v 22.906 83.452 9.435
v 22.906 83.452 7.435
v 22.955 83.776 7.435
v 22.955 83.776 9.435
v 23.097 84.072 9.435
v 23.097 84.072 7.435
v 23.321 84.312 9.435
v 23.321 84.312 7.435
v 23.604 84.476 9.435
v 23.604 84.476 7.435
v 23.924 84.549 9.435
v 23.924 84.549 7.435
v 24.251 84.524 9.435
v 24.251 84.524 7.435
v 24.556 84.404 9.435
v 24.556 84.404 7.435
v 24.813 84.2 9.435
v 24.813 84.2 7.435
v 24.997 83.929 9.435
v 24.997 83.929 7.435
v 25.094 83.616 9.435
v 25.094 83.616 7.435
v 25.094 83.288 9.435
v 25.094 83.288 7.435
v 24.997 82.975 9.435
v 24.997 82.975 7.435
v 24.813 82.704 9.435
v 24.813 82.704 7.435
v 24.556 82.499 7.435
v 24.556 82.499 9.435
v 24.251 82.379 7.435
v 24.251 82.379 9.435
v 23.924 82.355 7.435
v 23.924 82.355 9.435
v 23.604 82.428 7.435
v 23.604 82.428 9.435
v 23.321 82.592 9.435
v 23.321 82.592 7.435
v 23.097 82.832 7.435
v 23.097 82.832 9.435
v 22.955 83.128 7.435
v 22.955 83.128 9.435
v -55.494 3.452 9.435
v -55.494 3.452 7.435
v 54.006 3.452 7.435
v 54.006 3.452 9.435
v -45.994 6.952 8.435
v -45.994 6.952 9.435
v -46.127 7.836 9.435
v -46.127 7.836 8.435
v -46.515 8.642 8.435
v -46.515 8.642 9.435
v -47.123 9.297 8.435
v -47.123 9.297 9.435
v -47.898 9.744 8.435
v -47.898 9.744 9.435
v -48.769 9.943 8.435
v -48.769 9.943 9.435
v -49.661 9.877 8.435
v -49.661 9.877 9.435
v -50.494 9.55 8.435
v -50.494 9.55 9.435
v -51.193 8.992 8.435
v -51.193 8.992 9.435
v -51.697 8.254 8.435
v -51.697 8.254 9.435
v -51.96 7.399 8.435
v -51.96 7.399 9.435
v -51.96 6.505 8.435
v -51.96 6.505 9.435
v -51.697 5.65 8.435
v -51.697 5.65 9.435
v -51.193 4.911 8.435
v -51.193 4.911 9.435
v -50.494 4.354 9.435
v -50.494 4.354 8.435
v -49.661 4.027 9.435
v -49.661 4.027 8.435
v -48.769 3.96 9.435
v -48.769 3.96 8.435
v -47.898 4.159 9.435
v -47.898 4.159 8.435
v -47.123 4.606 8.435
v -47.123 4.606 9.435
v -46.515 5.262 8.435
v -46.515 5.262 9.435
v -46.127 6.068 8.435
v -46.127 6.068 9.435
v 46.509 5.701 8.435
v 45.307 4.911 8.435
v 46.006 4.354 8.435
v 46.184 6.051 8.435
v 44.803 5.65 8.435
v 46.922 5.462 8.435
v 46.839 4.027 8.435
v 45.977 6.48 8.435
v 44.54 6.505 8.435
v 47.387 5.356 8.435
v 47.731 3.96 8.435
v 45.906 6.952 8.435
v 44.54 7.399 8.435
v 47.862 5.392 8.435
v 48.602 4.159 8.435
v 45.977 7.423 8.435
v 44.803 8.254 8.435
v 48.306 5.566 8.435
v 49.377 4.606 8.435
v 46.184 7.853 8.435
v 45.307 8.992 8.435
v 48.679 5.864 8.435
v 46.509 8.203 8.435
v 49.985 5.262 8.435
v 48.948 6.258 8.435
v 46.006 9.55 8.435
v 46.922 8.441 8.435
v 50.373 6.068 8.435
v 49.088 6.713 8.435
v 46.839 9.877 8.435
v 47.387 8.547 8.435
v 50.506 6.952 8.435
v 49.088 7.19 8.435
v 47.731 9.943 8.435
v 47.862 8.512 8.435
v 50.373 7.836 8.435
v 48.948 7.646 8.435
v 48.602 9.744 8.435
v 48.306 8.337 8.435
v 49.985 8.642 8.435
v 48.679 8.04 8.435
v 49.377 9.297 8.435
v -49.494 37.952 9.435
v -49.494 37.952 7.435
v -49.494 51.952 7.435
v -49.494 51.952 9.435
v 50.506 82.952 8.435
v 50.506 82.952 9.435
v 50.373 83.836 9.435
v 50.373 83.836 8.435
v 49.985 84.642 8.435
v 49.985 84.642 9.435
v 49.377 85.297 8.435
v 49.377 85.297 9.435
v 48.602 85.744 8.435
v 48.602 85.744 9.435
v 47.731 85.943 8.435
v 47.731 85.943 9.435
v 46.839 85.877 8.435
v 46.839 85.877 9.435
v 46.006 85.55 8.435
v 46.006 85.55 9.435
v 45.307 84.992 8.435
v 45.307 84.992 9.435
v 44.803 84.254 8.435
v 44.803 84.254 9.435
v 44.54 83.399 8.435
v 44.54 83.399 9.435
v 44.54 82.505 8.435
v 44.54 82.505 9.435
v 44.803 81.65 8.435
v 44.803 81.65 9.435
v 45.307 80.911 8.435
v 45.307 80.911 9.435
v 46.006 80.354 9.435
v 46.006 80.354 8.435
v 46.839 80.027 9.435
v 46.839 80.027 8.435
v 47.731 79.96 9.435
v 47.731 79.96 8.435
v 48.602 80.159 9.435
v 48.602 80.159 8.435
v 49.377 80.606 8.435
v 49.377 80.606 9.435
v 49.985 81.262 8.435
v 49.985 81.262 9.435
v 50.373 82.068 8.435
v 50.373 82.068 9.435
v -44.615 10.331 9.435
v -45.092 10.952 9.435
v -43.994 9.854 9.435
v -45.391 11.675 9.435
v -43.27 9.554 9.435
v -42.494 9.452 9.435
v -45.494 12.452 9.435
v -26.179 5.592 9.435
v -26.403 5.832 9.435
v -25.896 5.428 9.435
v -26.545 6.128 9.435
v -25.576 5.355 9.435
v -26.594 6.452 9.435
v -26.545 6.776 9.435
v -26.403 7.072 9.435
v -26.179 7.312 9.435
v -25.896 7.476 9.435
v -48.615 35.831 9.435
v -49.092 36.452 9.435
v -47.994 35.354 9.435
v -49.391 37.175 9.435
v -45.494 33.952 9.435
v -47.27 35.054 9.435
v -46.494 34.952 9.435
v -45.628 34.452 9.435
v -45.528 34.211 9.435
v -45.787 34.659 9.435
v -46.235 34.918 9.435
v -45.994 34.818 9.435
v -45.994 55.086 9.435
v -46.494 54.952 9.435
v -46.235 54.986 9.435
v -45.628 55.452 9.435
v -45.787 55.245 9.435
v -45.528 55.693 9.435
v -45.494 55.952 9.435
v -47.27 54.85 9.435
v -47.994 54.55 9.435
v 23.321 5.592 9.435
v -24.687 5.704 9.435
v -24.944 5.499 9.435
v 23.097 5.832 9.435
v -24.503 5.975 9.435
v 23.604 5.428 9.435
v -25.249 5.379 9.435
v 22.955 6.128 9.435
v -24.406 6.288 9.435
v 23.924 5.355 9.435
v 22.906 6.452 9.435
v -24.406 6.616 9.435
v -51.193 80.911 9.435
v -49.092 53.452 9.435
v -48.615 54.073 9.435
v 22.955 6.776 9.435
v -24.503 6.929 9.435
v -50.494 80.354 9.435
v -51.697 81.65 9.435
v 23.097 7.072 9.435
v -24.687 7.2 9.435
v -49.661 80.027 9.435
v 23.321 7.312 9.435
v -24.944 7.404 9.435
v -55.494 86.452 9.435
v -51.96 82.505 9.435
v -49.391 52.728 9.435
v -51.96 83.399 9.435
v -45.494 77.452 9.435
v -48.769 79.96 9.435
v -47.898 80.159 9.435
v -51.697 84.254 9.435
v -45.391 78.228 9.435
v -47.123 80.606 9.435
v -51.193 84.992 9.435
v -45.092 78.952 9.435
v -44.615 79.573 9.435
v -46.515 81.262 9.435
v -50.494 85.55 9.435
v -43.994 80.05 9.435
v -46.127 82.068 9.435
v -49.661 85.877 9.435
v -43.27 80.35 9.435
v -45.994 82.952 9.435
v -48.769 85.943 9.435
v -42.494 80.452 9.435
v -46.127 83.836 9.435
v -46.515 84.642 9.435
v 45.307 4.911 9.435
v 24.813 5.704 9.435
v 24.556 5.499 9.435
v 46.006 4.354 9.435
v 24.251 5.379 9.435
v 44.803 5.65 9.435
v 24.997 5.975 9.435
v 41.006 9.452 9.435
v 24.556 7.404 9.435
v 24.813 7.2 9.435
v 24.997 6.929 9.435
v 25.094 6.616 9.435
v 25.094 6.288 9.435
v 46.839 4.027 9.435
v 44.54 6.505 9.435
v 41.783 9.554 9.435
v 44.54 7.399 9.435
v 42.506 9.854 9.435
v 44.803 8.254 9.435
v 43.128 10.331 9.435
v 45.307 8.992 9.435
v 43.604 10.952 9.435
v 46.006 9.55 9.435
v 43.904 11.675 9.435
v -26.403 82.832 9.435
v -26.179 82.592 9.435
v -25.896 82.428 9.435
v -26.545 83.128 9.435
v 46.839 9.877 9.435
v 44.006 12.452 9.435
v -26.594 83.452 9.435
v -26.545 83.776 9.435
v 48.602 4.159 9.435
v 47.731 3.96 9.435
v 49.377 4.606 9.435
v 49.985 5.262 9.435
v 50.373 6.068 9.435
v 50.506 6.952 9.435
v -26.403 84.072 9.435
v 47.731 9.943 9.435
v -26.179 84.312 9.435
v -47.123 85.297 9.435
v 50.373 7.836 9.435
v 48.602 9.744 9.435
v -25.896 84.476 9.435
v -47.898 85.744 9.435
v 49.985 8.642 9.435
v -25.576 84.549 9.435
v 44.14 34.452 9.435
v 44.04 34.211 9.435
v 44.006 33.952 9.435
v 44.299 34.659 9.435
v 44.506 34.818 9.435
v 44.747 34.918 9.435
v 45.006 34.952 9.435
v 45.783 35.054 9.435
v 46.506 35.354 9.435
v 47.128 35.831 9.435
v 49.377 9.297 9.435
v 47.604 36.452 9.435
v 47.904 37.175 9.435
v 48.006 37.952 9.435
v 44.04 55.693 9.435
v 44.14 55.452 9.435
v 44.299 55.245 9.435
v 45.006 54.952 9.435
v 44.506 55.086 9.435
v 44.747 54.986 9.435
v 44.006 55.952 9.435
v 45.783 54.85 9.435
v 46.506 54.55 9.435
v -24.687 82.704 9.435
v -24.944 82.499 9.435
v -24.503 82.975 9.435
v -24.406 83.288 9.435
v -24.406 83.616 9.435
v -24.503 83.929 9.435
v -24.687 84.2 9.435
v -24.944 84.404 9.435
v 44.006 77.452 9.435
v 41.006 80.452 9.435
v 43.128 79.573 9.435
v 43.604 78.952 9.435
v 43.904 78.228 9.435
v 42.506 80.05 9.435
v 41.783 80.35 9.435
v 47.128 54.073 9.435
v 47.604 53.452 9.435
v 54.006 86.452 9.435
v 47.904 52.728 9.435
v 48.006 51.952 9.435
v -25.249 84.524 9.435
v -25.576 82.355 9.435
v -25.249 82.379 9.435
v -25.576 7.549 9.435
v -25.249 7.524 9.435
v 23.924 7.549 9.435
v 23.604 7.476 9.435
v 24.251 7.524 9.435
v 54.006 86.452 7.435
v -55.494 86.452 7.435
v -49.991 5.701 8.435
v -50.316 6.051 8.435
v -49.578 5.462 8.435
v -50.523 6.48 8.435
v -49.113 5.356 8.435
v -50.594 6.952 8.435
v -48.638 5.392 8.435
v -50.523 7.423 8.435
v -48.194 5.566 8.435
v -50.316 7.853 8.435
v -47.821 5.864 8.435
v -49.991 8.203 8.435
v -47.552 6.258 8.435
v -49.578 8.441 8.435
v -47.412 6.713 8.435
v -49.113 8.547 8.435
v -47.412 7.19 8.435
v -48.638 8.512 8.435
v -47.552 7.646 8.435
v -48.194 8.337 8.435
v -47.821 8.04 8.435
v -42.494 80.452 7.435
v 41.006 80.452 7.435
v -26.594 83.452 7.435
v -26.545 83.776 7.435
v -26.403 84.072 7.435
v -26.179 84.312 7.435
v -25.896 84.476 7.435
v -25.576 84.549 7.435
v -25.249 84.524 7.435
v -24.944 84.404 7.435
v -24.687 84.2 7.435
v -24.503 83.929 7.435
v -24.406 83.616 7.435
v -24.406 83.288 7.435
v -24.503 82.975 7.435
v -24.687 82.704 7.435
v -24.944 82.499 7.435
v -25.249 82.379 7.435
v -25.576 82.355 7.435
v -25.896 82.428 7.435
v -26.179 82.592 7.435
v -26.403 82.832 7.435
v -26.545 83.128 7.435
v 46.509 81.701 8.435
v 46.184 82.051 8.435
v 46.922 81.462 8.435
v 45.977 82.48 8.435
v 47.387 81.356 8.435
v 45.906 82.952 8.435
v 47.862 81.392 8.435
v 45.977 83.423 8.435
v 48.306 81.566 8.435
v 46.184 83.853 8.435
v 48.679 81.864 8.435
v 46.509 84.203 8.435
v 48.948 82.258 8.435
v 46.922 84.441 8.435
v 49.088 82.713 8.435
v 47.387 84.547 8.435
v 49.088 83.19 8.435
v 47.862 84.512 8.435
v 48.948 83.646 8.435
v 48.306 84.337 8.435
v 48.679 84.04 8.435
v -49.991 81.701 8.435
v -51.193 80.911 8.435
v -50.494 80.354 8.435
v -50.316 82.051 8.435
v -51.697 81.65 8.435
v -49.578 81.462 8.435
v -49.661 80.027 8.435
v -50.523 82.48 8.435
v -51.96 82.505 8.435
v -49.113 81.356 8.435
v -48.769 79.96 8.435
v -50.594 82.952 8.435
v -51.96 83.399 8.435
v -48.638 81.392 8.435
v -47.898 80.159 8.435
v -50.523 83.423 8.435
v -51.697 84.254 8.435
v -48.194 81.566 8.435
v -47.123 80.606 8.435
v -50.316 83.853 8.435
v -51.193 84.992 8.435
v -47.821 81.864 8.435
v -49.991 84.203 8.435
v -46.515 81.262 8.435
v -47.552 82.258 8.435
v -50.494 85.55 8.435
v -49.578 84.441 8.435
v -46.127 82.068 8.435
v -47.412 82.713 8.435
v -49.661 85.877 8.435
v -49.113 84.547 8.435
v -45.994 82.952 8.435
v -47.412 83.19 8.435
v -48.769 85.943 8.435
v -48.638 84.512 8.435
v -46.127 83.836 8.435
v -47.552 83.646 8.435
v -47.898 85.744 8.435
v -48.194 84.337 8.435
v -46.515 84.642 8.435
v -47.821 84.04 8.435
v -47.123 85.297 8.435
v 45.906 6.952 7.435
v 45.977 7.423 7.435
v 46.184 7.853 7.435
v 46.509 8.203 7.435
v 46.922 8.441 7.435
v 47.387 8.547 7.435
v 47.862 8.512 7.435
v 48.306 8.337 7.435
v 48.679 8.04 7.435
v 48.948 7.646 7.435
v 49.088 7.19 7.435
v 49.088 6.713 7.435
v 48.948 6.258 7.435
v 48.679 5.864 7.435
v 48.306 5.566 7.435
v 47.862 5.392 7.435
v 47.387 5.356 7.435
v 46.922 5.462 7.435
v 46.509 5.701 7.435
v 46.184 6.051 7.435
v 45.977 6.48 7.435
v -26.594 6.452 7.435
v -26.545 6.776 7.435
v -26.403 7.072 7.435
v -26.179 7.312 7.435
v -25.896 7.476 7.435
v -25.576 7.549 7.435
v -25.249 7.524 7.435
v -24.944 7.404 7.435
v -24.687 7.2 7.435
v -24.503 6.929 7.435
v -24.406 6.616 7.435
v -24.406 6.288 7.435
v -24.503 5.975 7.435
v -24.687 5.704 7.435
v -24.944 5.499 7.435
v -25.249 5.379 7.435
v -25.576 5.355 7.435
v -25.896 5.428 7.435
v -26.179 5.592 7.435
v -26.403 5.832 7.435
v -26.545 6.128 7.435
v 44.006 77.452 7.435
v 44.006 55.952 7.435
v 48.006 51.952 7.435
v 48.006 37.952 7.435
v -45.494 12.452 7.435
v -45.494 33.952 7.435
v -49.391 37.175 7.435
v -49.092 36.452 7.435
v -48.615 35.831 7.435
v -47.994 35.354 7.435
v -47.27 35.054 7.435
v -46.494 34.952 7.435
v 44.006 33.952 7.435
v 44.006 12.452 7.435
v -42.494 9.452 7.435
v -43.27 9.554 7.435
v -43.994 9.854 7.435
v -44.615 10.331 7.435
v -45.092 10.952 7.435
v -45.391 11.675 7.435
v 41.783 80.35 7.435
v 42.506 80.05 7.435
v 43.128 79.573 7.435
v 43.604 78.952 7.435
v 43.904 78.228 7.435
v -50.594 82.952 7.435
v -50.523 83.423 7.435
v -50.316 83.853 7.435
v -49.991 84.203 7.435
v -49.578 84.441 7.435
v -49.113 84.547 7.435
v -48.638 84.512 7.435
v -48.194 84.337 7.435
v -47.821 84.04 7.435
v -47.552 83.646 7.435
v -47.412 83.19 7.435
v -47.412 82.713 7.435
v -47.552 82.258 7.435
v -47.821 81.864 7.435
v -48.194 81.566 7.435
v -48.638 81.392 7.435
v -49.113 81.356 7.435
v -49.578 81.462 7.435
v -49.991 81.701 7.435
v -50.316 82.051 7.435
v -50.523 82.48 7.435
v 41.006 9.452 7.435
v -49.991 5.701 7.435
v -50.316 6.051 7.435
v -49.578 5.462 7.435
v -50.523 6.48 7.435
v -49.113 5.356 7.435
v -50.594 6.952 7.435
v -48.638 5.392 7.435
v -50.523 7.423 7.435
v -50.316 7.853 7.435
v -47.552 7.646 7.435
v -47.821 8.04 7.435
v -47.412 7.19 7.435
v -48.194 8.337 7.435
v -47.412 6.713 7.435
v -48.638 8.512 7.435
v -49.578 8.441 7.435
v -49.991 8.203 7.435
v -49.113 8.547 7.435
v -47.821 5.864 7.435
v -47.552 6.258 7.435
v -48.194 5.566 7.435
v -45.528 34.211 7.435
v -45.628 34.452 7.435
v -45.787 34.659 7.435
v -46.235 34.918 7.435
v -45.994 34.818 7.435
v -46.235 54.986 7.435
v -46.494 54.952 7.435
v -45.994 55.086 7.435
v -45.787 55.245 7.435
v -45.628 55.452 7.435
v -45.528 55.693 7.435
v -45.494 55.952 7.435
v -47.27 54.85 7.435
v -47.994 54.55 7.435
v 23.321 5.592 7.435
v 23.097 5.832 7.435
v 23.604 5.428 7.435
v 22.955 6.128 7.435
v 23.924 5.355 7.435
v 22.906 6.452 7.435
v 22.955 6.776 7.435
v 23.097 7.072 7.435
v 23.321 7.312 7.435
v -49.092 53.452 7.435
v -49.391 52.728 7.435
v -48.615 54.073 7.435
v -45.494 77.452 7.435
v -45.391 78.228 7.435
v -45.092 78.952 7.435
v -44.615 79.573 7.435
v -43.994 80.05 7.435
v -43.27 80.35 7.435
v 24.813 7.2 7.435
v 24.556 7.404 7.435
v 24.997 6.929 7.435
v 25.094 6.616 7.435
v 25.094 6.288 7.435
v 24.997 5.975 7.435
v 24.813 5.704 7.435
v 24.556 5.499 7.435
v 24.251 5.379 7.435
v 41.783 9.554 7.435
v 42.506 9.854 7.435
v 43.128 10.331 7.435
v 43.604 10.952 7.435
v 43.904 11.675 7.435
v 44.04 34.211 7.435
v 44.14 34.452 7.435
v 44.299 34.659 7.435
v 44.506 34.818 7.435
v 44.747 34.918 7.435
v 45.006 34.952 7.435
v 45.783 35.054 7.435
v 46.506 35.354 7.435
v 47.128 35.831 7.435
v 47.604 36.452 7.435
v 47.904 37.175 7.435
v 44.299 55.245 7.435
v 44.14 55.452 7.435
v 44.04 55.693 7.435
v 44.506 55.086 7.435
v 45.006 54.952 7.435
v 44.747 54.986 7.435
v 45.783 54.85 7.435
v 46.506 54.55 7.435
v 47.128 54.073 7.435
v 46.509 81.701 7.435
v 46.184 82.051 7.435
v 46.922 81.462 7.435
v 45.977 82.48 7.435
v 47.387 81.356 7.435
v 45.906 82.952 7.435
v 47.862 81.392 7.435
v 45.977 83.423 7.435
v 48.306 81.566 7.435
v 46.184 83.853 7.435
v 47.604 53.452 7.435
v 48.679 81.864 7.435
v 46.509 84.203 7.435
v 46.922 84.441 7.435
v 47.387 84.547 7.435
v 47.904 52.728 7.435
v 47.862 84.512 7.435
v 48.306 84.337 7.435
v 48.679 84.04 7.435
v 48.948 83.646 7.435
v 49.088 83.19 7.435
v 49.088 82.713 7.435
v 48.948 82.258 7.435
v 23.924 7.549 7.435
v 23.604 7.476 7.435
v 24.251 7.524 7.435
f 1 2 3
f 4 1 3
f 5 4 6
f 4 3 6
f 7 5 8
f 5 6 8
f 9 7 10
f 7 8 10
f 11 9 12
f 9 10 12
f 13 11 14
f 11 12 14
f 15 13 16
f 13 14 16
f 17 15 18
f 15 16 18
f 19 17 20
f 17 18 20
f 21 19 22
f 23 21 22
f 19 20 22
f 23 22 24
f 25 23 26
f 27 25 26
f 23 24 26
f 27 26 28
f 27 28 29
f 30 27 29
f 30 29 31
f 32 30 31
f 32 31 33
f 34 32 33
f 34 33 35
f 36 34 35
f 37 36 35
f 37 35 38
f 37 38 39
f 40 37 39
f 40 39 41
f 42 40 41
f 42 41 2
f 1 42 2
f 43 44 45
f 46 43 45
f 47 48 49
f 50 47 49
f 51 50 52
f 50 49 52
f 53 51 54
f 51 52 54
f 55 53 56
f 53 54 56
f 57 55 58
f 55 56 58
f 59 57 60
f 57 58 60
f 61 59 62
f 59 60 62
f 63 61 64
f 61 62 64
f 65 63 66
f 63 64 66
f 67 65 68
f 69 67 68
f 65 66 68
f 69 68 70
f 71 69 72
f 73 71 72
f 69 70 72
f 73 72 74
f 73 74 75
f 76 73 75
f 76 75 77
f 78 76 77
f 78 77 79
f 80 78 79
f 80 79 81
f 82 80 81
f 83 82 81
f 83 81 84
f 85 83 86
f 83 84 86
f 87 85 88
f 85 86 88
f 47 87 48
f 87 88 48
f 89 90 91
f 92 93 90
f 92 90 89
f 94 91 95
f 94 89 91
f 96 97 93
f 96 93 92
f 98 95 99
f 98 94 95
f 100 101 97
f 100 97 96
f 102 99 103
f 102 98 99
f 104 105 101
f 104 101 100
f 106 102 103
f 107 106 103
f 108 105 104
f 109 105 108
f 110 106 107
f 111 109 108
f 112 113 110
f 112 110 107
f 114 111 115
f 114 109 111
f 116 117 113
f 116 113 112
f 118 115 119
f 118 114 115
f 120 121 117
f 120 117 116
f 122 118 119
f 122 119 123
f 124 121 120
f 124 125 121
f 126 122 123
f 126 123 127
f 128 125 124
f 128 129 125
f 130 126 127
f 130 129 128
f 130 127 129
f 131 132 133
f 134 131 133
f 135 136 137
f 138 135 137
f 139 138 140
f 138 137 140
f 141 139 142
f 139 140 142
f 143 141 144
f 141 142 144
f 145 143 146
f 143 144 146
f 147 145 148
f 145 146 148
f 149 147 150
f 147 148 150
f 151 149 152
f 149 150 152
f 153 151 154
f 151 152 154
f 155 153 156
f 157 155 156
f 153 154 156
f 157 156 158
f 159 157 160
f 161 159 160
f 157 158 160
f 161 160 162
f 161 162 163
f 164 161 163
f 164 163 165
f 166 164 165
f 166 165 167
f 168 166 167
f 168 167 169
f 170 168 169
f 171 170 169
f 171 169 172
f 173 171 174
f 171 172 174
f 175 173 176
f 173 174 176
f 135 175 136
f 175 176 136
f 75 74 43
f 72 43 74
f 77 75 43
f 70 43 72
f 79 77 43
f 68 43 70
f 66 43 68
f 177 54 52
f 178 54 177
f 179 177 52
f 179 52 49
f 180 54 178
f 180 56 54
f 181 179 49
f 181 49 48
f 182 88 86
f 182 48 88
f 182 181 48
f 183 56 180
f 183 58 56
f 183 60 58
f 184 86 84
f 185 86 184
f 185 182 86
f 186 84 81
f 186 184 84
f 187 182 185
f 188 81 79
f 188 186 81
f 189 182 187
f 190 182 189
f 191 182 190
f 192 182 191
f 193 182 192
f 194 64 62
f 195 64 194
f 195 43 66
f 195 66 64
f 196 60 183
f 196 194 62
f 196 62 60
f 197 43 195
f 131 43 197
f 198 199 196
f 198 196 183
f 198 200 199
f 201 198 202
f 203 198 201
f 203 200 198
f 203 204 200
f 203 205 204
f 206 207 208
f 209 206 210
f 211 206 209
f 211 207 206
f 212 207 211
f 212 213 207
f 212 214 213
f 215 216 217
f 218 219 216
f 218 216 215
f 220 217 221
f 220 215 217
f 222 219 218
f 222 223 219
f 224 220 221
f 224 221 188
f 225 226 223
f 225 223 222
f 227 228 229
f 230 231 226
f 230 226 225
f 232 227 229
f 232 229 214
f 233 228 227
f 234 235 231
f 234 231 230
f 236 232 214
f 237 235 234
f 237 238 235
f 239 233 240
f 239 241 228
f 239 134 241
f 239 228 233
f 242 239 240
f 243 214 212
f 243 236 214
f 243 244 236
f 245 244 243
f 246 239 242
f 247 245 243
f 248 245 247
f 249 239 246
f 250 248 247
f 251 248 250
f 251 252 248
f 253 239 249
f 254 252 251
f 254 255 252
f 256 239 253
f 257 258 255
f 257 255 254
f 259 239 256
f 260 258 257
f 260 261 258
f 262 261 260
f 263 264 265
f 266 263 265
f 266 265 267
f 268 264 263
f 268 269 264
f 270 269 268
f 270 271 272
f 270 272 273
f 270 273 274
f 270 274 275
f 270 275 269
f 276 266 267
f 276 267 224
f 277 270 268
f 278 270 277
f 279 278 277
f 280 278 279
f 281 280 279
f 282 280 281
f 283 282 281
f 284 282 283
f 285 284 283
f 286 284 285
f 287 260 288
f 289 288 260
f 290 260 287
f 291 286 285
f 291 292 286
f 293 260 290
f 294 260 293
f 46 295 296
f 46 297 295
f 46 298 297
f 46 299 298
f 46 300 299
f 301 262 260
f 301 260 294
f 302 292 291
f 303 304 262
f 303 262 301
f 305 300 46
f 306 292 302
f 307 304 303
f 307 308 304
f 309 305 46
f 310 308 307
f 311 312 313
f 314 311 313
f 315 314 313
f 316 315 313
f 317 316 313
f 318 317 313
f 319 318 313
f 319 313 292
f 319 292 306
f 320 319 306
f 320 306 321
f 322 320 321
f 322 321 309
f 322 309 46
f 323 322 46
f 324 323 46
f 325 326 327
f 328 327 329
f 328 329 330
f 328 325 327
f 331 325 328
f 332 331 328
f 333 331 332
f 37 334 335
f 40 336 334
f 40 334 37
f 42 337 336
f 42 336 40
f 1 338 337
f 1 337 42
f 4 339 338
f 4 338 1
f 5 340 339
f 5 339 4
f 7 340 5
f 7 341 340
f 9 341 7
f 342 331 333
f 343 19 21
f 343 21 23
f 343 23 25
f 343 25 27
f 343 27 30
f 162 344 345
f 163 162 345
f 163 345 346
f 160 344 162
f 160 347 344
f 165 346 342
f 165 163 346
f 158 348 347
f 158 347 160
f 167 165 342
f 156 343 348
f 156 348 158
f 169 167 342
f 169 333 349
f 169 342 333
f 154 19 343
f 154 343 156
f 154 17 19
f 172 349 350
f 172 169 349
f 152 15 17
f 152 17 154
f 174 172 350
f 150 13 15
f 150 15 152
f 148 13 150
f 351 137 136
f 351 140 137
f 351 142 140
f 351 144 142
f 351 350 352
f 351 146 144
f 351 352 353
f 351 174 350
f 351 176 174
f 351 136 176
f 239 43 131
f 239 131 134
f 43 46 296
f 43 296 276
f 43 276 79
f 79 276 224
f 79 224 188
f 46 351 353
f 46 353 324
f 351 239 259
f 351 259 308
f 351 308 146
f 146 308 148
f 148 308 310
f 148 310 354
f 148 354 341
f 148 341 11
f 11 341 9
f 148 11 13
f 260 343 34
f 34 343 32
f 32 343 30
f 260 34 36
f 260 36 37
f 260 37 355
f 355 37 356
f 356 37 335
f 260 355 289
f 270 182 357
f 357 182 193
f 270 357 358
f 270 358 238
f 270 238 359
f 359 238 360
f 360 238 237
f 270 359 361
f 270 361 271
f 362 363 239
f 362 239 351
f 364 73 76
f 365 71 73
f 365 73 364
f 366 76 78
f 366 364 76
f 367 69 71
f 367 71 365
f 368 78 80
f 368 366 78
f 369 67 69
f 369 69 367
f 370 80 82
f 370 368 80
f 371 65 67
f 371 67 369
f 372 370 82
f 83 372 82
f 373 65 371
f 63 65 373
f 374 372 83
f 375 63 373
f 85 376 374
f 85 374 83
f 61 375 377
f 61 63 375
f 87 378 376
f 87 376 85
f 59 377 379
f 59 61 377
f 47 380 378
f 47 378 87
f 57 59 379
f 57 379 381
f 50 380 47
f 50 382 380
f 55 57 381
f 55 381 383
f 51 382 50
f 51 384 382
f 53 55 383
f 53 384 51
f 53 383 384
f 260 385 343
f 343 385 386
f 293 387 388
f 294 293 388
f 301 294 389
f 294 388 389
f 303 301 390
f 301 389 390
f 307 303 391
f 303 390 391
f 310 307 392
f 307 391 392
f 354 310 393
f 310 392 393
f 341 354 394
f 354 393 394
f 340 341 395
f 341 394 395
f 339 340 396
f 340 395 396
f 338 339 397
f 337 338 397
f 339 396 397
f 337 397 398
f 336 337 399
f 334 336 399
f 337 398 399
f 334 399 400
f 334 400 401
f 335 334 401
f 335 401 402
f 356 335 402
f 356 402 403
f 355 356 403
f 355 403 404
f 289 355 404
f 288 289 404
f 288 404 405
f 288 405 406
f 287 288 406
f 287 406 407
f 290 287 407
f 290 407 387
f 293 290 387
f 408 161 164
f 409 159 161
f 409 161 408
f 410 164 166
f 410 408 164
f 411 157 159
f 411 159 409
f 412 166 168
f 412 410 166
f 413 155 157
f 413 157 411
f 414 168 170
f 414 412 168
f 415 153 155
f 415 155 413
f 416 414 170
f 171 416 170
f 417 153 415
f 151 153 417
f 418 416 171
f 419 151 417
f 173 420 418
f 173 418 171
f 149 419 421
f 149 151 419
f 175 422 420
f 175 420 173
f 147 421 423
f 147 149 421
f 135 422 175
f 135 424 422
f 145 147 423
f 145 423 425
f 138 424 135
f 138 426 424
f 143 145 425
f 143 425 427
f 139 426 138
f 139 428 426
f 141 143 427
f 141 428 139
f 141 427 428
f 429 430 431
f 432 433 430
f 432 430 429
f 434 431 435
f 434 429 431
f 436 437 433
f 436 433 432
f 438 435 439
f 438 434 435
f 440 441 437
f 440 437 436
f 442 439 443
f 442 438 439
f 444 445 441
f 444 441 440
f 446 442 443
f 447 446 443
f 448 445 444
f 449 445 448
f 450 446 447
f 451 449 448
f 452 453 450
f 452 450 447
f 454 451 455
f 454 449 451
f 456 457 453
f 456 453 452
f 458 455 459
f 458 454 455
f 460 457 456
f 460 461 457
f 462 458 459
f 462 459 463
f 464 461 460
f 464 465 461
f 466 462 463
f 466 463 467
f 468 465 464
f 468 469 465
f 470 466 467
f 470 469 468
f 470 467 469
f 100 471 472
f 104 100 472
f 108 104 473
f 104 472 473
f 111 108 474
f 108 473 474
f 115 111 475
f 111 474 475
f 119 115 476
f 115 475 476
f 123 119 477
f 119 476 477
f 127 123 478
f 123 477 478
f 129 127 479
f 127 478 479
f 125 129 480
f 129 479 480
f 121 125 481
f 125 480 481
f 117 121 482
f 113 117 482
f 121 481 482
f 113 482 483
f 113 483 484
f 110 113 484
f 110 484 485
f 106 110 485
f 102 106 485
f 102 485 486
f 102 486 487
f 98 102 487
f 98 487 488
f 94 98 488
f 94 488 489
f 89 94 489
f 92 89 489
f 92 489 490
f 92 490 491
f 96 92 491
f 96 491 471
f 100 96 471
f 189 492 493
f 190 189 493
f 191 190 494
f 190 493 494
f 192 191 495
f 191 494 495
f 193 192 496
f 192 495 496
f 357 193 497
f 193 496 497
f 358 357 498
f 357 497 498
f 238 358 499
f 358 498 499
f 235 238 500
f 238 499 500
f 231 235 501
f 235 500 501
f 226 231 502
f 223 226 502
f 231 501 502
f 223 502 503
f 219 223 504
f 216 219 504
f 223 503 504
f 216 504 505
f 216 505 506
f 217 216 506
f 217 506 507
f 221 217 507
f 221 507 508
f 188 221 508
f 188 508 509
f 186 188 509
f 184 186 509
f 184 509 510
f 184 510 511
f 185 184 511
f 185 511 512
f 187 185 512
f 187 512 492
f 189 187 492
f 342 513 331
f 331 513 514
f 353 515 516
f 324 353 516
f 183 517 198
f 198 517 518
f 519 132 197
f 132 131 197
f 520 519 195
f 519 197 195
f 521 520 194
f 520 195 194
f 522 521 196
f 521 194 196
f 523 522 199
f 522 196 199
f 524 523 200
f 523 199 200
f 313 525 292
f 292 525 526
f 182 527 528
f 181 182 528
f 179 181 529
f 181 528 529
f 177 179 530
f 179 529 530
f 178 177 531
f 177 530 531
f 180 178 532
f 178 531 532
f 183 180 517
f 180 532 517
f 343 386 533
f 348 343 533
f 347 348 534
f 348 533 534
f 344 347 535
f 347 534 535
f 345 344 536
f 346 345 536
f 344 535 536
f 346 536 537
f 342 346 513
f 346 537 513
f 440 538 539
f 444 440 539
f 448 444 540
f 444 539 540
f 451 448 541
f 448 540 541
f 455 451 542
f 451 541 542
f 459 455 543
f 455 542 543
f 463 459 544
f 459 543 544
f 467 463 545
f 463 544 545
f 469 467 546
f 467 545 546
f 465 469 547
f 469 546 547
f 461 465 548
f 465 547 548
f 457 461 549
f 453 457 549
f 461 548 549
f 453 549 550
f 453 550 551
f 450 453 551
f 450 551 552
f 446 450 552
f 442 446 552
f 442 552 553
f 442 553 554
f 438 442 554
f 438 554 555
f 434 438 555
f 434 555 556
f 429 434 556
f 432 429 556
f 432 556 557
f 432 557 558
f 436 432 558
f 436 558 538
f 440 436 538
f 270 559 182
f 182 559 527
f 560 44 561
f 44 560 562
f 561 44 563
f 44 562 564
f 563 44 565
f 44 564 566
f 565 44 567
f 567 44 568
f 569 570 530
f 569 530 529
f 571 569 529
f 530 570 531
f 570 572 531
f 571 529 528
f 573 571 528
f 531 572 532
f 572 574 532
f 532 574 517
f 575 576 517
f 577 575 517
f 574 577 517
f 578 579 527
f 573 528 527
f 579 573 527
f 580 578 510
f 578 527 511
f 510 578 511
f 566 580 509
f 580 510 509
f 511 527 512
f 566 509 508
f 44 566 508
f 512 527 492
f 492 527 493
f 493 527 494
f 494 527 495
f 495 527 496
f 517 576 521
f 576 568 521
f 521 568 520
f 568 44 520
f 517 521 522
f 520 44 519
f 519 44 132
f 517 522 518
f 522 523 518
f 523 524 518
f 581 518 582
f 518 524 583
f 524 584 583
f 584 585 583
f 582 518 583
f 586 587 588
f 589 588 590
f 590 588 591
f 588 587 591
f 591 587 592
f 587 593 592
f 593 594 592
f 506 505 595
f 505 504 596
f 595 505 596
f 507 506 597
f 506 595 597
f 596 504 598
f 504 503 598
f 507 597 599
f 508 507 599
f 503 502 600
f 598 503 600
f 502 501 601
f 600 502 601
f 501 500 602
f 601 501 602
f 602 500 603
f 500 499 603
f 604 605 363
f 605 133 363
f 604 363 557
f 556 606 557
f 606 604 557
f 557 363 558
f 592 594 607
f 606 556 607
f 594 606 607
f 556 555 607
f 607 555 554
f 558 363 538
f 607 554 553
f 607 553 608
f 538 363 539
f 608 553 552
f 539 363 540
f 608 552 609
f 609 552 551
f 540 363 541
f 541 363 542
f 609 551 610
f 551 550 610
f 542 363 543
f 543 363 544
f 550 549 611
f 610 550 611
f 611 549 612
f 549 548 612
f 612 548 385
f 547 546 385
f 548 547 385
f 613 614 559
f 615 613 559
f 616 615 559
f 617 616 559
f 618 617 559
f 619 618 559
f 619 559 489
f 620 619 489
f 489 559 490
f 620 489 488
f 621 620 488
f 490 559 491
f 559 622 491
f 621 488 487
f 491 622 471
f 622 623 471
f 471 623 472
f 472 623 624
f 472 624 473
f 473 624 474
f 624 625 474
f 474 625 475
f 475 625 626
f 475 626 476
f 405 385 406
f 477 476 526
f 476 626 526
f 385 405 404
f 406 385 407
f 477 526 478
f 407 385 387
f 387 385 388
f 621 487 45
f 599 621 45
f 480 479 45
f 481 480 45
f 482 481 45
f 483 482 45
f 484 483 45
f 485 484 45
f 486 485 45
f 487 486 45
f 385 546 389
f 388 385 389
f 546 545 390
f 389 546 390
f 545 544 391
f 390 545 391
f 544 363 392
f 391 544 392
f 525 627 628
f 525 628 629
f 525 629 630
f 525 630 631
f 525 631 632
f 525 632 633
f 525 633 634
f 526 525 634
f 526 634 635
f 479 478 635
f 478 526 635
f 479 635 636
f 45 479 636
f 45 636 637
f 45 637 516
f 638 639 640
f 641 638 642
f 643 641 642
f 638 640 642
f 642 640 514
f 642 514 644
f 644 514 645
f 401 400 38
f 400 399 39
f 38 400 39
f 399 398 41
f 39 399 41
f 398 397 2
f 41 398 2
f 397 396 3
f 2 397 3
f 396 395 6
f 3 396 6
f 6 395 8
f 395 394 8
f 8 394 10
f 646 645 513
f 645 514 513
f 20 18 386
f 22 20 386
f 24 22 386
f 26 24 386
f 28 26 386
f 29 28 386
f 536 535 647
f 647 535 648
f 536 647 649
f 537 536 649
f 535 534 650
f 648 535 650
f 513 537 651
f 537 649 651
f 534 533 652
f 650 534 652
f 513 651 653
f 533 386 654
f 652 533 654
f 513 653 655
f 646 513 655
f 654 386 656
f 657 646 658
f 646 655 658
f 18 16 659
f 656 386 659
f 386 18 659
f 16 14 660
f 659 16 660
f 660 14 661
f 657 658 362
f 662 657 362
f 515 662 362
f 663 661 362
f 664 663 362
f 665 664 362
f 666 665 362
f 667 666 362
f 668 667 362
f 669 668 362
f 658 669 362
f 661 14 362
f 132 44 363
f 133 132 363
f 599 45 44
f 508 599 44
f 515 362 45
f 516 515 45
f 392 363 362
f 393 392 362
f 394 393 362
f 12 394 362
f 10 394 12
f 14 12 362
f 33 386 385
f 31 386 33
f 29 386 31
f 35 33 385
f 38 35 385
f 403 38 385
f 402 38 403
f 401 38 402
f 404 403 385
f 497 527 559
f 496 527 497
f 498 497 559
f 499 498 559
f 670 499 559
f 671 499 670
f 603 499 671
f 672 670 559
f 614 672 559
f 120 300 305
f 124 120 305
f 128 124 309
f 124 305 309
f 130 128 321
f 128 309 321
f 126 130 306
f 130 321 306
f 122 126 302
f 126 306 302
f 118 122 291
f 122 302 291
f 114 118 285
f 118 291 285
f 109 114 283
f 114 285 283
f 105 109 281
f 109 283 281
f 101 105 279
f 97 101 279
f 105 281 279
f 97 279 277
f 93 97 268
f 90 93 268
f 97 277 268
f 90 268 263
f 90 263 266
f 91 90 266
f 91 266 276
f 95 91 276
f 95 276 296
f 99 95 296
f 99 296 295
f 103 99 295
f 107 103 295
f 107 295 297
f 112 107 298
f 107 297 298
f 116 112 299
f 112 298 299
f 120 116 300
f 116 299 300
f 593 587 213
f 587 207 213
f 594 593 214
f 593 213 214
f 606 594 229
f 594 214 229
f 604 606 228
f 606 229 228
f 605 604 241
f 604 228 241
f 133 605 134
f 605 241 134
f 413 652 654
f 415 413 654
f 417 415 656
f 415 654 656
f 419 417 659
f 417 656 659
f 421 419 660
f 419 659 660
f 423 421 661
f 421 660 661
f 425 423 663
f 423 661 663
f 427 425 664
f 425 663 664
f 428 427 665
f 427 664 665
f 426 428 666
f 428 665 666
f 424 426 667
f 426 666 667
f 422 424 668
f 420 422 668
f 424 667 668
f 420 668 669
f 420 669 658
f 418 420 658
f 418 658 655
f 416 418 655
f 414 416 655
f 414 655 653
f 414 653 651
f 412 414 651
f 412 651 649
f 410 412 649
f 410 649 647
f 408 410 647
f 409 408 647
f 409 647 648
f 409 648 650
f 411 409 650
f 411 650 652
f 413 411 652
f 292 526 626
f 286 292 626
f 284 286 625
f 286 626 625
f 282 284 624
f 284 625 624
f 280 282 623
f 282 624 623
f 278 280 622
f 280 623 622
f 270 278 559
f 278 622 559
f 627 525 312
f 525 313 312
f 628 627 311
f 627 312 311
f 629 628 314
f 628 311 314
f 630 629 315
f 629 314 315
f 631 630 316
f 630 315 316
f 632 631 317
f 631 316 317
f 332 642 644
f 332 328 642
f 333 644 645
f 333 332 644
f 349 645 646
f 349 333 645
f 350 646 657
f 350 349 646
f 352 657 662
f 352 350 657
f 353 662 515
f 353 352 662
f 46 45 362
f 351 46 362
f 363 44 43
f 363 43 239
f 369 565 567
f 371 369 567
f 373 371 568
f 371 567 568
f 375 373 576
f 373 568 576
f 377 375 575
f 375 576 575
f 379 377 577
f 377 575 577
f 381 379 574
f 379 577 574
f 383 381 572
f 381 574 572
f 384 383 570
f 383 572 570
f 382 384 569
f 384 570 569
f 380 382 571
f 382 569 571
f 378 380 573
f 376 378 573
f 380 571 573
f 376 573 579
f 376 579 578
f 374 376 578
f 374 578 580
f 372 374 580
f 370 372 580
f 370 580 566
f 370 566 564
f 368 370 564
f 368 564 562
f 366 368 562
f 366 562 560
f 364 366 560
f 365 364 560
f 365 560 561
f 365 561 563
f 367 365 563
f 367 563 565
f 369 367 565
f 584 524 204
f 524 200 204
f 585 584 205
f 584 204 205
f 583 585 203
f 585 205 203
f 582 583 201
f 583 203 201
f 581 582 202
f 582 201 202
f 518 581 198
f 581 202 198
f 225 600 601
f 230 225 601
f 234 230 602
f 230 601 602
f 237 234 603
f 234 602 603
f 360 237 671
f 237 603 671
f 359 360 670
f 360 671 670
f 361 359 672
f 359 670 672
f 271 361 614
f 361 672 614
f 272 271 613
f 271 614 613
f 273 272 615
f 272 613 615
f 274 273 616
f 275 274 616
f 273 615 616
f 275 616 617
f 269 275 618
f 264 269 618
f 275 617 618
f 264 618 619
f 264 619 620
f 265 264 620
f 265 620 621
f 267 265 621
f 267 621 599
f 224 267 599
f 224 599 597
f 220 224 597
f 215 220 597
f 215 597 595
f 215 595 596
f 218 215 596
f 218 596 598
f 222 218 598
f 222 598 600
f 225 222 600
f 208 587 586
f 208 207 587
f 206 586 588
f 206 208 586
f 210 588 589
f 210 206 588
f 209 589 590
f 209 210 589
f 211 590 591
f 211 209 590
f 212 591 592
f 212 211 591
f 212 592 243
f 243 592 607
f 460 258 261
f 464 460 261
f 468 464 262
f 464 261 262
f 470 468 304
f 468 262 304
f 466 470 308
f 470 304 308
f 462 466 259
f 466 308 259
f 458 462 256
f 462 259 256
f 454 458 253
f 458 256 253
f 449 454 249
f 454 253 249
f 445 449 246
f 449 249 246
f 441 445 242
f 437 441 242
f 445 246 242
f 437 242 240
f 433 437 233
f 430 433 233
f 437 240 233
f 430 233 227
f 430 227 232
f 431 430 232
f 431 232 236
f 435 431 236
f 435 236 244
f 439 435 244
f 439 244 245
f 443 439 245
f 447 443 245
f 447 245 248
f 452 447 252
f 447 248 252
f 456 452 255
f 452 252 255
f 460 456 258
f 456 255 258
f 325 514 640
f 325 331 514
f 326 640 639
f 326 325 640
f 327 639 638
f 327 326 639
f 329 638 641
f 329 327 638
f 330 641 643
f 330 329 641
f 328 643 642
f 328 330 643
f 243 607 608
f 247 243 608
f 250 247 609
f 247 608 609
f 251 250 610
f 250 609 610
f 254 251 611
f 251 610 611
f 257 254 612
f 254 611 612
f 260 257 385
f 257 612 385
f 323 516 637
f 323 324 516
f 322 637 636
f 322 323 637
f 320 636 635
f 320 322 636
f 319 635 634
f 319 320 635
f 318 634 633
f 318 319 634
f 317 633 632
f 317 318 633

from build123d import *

# Parameters (mm, degrees)
SKETCH1_W                  = 109.5
SKETCH1_H                  = 83
BOSS_EXTRUDE1_DEPTH        = 2
F_3_2_3_2_DIAMETER_HOLE1_D = 3.2
F_2_2_2_2_DIAMETER_HOLE1_D = 2.2
SKETCH12_R                 = 3
CUT_EXTRUDE1_DEPTH         = 1
FILLET1_R                  = 3
FILLET2_R                  = 1


with BuildPart() as part:
    # Sketch1 → Boss-Extrude1 (new body)
    with BuildSketch(Plane.XY.offset(7.43465612)):
        with Locations((-0.743641502, 44.95185693)):
            Rectangle(SKETCH1_W, SKETCH1_H)
        with BuildLine():
            Line((-42.493641502, 80.45185693), (41.006358498, 80.45185693))
            ThreePointArc((41.006358498, 80.45185693), (43.127678842, 79.573177274), (44.006358498, 77.45185693))
            Line((44.006358498, 77.45185693), (44.006358498, 54.95185693))
            Line((44.006358498, 54.95185693), (48.006358498, 54.95185693))
            Line((48.006358498, 54.95185693), (48.006358498, 44.95185693))
            Line((48.006358498, 44.95185693), (48.006358498, 34.95185693))
            Line((48.006358498, 34.95185693), (44.006358498, 34.95185693))
            Line((44.006358498, 34.95185693), (44.006358498, 12.45185693))
            ThreePointArc((44.006358498, 12.45185693), (43.127678842, 10.330536587), (41.006358498, 9.45185693))
            Line((41.006358498, 9.45185693), (-42.493641502, 9.45185693))
            ThreePointArc((-42.493641502, 9.45185693), (-44.614961845, 10.330536587), (-45.493641502, 12.45185693))
            Line((-45.493641502, 12.45185693), (-45.493641502, 34.95185693))
            Line((-45.493641502, 34.95185693), (-49.493641502, 34.95185693))
            Line((-49.493641502, 34.95185693), (-49.493641502, 54.95185693))
            Line((-49.493641502, 54.95185693), (-45.493641502, 54.95185693))
            Line((-45.493641502, 54.95185693), (-45.493641502, 77.45185693))
            ThreePointArc((-45.493641502, 77.45185693), (-44.614961845, 79.573177274), (-42.493641502, 80.45185693))
        make_face(mode=Mode.SUBTRACT)
    extrude(amount=BOSS_EXTRUDE1_DEPTH)

    # Ø3.2 (3.2) Diameter Hole1 (through all)
    with Locations(Plane.XY.offset(9.43465612)):
        with Locations((-48.993641502, 6.95185693), (-48.993641502, 82.95185693), (47.506358498, 82.95185693), (47.506358498, 6.95185693)):
            Hole(F_3_2_3_2_DIAMETER_HOLE1_D / 2)

    # Ø2.2 (2.2) Diameter Hole1 (through all)
    with Locations(Plane(origin=(-25.493641502, 83.45185693, 9.43465612), x_dir=(1, 0, 0), z_dir=(0, 0, 1))):
        with Locations((0, 0), (49.5, 0), (49.5, -77), (0, -77)):
            Hole(F_2_2_2_2_DIAMETER_HOLE1_D / 2)

    # Sketch12 → Cut-Extrude1 (cut)
    with BuildSketch(Plane.XY.offset(9.43465612)):
        with Locations((-48.993641502, 82.95185693)):
            Circle(SKETCH12_R)
        with Locations((47.506358498, 82.95185693)):
            Circle(SKETCH12_R)
        with Locations((47.506358498, 6.95185693)):
            Circle(SKETCH12_R)
        with Locations((-48.993641502, 6.95185693)):
            Circle(SKETCH12_R)
    extrude(amount=-CUT_EXTRUDE1_DEPTH, mode=Mode.SUBTRACT)

    # Fillet1
    fillet1_edges = [part.edges().sort_by_distance(p)[0] for p in [
        (48.006358498, 34.95185693, 8.43465612),
        (48.006358498, 54.95185693, 8.43465612),
        (-49.493641502, 54.95185693, 8.43465612),
        (-49.493641502, 34.95185693, 8.43465612),
    ]]
    fillet(fillet1_edges, radius=FILLET1_R)

    # Fillet2
    fillet2_edges = [part.edges().sort_by_distance(p)[0] for p in [
        (44.006358498, 34.95185693, 8.43465612),
        (44.006358498, 54.95185693, 8.43465612),
        (-45.493641502, 34.95185693, 8.43465612),
        (-45.493641502, 54.95185693, 8.43465612),
    ]]
    fillet(fillet2_edges, radius=FILLET2_R - 0.0001)  # a hair under: the kernel refuses the full size


solid = part.part
